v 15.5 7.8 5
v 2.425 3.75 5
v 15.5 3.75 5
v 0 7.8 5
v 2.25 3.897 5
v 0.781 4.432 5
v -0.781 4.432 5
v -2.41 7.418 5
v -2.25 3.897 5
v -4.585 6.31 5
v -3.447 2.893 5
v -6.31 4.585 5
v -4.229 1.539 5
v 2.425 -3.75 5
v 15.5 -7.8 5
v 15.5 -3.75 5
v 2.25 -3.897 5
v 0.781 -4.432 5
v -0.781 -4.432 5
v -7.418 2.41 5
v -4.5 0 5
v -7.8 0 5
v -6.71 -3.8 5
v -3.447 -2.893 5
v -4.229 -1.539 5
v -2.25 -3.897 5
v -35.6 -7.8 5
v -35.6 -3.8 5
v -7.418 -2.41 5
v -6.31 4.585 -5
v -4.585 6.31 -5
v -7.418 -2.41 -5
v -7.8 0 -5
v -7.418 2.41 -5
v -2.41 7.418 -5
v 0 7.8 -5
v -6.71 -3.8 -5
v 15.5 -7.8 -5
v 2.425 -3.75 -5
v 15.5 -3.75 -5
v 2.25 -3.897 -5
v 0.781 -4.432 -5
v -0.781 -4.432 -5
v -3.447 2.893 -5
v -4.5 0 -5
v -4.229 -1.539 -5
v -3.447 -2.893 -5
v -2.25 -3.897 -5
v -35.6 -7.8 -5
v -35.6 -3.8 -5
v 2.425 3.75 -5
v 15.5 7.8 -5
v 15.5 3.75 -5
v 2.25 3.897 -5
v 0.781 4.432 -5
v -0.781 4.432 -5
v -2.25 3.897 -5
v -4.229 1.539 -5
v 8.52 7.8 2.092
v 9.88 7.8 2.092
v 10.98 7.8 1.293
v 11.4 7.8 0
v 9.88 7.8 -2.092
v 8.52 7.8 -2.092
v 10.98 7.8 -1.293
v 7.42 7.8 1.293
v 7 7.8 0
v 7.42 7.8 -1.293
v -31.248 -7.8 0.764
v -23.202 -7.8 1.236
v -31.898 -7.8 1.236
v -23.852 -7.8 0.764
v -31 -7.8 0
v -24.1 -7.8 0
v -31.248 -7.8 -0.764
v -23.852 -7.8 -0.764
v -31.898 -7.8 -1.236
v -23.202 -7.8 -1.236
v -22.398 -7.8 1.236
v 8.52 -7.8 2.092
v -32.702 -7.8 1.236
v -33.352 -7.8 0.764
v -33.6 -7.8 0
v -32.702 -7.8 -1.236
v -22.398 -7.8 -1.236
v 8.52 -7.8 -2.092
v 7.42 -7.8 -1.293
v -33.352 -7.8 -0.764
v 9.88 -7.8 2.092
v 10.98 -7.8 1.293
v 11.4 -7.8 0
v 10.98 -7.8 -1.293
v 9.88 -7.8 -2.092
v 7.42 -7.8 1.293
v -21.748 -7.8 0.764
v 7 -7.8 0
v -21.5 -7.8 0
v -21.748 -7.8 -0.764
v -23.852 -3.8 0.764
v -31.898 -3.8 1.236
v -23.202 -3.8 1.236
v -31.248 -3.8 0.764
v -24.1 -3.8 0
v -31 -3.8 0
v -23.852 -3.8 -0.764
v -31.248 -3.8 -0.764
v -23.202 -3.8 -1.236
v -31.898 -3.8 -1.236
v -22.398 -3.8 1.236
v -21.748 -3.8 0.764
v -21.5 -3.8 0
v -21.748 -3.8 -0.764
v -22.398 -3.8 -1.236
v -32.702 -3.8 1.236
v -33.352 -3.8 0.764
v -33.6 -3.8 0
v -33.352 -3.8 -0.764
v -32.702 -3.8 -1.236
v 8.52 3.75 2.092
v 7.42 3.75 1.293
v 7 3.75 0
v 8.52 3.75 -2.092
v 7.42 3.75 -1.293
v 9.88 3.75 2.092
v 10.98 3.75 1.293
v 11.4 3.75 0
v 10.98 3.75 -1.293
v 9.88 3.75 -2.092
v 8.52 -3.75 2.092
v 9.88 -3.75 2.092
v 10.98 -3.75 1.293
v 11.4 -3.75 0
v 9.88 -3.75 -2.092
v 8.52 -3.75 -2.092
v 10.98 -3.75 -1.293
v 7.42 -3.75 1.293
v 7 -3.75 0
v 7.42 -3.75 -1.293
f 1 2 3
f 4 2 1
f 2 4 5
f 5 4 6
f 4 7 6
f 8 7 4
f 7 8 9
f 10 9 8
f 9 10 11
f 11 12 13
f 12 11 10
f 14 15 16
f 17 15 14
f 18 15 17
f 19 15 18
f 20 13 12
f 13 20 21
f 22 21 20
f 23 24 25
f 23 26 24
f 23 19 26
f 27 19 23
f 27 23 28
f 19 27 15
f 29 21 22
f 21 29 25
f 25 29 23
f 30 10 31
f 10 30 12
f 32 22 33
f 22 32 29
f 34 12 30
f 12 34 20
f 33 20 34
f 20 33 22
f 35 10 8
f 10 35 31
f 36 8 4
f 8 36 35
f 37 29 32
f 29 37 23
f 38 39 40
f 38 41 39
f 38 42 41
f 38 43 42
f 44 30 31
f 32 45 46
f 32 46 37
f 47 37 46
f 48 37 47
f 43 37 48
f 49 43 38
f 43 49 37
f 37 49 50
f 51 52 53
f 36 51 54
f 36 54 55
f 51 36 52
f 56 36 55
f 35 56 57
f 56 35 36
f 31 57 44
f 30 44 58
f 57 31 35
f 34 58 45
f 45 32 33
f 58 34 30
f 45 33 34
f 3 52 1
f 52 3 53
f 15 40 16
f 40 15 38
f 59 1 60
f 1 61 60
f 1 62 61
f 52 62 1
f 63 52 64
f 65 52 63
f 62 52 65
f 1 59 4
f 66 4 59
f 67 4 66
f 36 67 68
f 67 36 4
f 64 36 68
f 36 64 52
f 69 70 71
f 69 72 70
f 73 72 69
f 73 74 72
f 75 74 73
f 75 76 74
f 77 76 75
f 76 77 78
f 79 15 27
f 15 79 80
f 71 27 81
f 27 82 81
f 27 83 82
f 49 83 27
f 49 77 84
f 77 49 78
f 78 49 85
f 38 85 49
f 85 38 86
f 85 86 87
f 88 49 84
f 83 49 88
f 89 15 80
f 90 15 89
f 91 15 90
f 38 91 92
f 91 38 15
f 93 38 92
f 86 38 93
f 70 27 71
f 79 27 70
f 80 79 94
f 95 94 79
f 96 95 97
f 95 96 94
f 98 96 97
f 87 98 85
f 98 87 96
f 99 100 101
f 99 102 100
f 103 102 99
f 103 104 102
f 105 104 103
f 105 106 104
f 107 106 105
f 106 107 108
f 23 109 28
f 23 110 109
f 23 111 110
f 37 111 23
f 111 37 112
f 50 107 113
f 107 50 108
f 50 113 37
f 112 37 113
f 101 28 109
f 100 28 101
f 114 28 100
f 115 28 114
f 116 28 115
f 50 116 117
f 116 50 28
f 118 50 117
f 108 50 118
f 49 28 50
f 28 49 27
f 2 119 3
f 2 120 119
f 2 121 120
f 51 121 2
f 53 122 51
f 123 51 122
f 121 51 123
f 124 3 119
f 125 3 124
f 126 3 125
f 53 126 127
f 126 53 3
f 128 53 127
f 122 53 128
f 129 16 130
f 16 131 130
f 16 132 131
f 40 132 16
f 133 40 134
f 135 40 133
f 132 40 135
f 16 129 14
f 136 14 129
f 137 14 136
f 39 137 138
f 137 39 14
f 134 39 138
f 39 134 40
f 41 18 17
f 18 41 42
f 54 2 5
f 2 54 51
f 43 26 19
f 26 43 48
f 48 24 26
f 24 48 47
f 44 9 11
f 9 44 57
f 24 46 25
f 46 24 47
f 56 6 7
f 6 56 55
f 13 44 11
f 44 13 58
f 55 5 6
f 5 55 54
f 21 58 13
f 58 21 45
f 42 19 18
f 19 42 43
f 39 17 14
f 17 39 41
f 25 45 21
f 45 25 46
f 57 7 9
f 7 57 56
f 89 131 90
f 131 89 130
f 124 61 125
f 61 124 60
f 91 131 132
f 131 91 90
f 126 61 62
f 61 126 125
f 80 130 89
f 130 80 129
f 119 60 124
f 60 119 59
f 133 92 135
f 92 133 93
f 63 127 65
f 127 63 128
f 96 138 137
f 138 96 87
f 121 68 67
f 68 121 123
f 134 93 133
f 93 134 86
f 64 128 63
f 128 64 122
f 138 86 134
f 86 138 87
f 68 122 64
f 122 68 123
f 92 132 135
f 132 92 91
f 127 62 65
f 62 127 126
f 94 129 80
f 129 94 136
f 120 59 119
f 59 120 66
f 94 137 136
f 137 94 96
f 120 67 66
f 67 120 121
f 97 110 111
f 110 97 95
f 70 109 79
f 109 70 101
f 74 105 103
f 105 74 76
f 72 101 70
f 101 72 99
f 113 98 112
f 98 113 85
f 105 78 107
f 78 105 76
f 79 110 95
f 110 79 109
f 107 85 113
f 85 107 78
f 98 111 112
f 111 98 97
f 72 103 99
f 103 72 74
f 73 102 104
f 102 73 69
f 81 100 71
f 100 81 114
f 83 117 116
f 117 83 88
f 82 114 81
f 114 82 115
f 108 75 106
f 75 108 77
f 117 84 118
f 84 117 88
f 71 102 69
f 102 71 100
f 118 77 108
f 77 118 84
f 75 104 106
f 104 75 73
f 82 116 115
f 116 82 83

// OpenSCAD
// file: configuration.scad
// PRUSA Mendel  
// Configuration file
// GNU GPL v2
// Josef Pra
// josefprusa@me.com
// prusadjs.cz
// http://www.reprap.org/wiki/Prusa_Mendel
// http://github.com/prusajr/PrusaMendel


// PLEASE SELECT ONE OF THE CONFIGURATIONS BELOW
// BY UN-COMMENTING IT


variant=0; //0 for metric
//variant=1; //1 for SAE
if(variant==0){
echo("variant: metric");
}else if(variant==1){
echo("variant: sae");
} else{
echo("WARNING: INVALID CONFIGURATION");
}




vars=[
//[m8_dia,m8_nut, m4_dia, m4_nut, m3_dia, m3_nut, bush_dia, mot_shaft, bush_rod, bush_outerdia, bush_length, m5_dia, m5_nut]
[9, 16.4, 5,9, 4.4, 7, 11, 5.3, 8, 16, 11, 5.6, 10],//metric
[9,15.7,5.5,10.6,5.5,10.6,11.5,5.3,7.9375,16,11,5.6, 10]//SAE
];


//BUSHING TYPE Can generate three versions
// 1 - regular old ones
// 2 - helical ones
// 3 - holders for brass or any other bought bushings
bushing_type = 2;


//Round corner diameter
round_corner_diameter = 8;


//Thin wall size
layer_height = 0.4;
perimeter_width_over_thicknes = 1.6;
infill_widht_over_thickness = 1.55;
thin_wall = 2*(perimeter_width_over_thicknes*layer_height+infill_widht_over_thickness*layer_height);
if(thin_wall<2){
	echo("Check thin wall size, its below 2mm!");
}
echo(thin_wall);


//DO NOT TOUCH THIS SECTION!
m8_diameter = vars[variant][0];
m8_nut_diameter = vars[variant][1];
m4_diameter = vars[variant][2];
m4_nut_diameter = vars[variant][3];
m3_diameter = vars[variant][4];
m3_nut_diameter = vars[variant][5];
bushing_diameter = vars[variant][6];
motor_shaft=vars[variant][7];
bushing_rodsize = vars[variant][8];
bushing_outerDiameter = vars[variant][9];
bushing_lenght = vars[variant][10];
m5_diameter = vars[variant][11];
m5_nut_diameter = vars[variant][12];



// MINI-HUXLEY VERSION (TODO, just place holder)
// include <configuration-huxley.scad>


// MEGA VERSION (TODO, just place holder)
// include <configuration-mega.scad>




// Some basic functions, probably should be somewhere else
module roundcorner(diameter){
	difference(){
		cube(size = [diameter,diameter,99], center = false);
		translate(v = [diameter, diameter, 0]) cylinder(h = 100, r=diameter, center=true);
	}
}
// main file
// PRUSA Mendel  
// Endstop holder
// Used to attach endstops to 8mm rods
// GNU GPL v2
// Josef Průša
// josefprusa@me.com
// prusadjs.cz
// http://www.reprap.org/wiki/Prusa_Mendel
// http://github.com/prusajr/PrusaMendel

// Modified by Adrian to include support for sub-min microswitches and to make PCB mounts too. 15 May 2011

include <configuration.scad>

/**
 *@name Endstop holder
 *@using 1 m3x20
 *@using 1 m3nut
 *@using 2 m3washer
 */
module endstop(){
outer_diameter = m8_diameter/2+3.3;
screw_hole_spacing = 9.5; // Set to 20 to get standard design
opening_size = m8_diameter-1.5; //openingsize
switch_screw_hole_radius = 1.3; // Set to m3_diameter/2 to get standard design
pcb_mount=false; // Set false for endstop
switch_add =11; // Set 0 for ordinary endstop, 11 for Z with adjuster
translate([-outer_diameter, -outer_diameter, -5]) 
difference(){

	union(){


		translate([outer_diameter, outer_diameter, 0]) cylinder(h =10, r = outer_diameter, $fn = 20);
		translate([outer_diameter, 0, 0]) cube([15.5,outer_diameter*2,10]);
		if(!pcb_mount)
			translate([-42,0, 0]) cube([50, 4, 10]);
	}

	// Chop the end just after the hole

	translate([-(56+screw_hole_spacing+ switch_screw_hole_radius+switch_add), -10, -10]) 
		cube([50, 50, 50]);

	translate([9, outer_diameter-opening_size/2, 0]) cube([18,opening_size,20]);
	translate([outer_diameter, outer_diameter, 0]) cylinder(h =20, r = m8_diameter/2, $fn = 18);
	translate([17, 17, 5]) rotate([90, 0, 0]) cylinder(h =20, r = m3_diameter/2, $fn = 10);
	translate([-4-switch_add, 17, 5]) rotate([90, 0, 0]) cylinder(h =20, r = switch_screw_hole_radius, $fn = 10);
	translate([-(4+switch_add+screw_hole_spacing), 17, 5]) rotate([90, 0, 0]) cylinder(h =20, r = switch_screw_hole_radius, $fn = 10);
}
}
endstop();
